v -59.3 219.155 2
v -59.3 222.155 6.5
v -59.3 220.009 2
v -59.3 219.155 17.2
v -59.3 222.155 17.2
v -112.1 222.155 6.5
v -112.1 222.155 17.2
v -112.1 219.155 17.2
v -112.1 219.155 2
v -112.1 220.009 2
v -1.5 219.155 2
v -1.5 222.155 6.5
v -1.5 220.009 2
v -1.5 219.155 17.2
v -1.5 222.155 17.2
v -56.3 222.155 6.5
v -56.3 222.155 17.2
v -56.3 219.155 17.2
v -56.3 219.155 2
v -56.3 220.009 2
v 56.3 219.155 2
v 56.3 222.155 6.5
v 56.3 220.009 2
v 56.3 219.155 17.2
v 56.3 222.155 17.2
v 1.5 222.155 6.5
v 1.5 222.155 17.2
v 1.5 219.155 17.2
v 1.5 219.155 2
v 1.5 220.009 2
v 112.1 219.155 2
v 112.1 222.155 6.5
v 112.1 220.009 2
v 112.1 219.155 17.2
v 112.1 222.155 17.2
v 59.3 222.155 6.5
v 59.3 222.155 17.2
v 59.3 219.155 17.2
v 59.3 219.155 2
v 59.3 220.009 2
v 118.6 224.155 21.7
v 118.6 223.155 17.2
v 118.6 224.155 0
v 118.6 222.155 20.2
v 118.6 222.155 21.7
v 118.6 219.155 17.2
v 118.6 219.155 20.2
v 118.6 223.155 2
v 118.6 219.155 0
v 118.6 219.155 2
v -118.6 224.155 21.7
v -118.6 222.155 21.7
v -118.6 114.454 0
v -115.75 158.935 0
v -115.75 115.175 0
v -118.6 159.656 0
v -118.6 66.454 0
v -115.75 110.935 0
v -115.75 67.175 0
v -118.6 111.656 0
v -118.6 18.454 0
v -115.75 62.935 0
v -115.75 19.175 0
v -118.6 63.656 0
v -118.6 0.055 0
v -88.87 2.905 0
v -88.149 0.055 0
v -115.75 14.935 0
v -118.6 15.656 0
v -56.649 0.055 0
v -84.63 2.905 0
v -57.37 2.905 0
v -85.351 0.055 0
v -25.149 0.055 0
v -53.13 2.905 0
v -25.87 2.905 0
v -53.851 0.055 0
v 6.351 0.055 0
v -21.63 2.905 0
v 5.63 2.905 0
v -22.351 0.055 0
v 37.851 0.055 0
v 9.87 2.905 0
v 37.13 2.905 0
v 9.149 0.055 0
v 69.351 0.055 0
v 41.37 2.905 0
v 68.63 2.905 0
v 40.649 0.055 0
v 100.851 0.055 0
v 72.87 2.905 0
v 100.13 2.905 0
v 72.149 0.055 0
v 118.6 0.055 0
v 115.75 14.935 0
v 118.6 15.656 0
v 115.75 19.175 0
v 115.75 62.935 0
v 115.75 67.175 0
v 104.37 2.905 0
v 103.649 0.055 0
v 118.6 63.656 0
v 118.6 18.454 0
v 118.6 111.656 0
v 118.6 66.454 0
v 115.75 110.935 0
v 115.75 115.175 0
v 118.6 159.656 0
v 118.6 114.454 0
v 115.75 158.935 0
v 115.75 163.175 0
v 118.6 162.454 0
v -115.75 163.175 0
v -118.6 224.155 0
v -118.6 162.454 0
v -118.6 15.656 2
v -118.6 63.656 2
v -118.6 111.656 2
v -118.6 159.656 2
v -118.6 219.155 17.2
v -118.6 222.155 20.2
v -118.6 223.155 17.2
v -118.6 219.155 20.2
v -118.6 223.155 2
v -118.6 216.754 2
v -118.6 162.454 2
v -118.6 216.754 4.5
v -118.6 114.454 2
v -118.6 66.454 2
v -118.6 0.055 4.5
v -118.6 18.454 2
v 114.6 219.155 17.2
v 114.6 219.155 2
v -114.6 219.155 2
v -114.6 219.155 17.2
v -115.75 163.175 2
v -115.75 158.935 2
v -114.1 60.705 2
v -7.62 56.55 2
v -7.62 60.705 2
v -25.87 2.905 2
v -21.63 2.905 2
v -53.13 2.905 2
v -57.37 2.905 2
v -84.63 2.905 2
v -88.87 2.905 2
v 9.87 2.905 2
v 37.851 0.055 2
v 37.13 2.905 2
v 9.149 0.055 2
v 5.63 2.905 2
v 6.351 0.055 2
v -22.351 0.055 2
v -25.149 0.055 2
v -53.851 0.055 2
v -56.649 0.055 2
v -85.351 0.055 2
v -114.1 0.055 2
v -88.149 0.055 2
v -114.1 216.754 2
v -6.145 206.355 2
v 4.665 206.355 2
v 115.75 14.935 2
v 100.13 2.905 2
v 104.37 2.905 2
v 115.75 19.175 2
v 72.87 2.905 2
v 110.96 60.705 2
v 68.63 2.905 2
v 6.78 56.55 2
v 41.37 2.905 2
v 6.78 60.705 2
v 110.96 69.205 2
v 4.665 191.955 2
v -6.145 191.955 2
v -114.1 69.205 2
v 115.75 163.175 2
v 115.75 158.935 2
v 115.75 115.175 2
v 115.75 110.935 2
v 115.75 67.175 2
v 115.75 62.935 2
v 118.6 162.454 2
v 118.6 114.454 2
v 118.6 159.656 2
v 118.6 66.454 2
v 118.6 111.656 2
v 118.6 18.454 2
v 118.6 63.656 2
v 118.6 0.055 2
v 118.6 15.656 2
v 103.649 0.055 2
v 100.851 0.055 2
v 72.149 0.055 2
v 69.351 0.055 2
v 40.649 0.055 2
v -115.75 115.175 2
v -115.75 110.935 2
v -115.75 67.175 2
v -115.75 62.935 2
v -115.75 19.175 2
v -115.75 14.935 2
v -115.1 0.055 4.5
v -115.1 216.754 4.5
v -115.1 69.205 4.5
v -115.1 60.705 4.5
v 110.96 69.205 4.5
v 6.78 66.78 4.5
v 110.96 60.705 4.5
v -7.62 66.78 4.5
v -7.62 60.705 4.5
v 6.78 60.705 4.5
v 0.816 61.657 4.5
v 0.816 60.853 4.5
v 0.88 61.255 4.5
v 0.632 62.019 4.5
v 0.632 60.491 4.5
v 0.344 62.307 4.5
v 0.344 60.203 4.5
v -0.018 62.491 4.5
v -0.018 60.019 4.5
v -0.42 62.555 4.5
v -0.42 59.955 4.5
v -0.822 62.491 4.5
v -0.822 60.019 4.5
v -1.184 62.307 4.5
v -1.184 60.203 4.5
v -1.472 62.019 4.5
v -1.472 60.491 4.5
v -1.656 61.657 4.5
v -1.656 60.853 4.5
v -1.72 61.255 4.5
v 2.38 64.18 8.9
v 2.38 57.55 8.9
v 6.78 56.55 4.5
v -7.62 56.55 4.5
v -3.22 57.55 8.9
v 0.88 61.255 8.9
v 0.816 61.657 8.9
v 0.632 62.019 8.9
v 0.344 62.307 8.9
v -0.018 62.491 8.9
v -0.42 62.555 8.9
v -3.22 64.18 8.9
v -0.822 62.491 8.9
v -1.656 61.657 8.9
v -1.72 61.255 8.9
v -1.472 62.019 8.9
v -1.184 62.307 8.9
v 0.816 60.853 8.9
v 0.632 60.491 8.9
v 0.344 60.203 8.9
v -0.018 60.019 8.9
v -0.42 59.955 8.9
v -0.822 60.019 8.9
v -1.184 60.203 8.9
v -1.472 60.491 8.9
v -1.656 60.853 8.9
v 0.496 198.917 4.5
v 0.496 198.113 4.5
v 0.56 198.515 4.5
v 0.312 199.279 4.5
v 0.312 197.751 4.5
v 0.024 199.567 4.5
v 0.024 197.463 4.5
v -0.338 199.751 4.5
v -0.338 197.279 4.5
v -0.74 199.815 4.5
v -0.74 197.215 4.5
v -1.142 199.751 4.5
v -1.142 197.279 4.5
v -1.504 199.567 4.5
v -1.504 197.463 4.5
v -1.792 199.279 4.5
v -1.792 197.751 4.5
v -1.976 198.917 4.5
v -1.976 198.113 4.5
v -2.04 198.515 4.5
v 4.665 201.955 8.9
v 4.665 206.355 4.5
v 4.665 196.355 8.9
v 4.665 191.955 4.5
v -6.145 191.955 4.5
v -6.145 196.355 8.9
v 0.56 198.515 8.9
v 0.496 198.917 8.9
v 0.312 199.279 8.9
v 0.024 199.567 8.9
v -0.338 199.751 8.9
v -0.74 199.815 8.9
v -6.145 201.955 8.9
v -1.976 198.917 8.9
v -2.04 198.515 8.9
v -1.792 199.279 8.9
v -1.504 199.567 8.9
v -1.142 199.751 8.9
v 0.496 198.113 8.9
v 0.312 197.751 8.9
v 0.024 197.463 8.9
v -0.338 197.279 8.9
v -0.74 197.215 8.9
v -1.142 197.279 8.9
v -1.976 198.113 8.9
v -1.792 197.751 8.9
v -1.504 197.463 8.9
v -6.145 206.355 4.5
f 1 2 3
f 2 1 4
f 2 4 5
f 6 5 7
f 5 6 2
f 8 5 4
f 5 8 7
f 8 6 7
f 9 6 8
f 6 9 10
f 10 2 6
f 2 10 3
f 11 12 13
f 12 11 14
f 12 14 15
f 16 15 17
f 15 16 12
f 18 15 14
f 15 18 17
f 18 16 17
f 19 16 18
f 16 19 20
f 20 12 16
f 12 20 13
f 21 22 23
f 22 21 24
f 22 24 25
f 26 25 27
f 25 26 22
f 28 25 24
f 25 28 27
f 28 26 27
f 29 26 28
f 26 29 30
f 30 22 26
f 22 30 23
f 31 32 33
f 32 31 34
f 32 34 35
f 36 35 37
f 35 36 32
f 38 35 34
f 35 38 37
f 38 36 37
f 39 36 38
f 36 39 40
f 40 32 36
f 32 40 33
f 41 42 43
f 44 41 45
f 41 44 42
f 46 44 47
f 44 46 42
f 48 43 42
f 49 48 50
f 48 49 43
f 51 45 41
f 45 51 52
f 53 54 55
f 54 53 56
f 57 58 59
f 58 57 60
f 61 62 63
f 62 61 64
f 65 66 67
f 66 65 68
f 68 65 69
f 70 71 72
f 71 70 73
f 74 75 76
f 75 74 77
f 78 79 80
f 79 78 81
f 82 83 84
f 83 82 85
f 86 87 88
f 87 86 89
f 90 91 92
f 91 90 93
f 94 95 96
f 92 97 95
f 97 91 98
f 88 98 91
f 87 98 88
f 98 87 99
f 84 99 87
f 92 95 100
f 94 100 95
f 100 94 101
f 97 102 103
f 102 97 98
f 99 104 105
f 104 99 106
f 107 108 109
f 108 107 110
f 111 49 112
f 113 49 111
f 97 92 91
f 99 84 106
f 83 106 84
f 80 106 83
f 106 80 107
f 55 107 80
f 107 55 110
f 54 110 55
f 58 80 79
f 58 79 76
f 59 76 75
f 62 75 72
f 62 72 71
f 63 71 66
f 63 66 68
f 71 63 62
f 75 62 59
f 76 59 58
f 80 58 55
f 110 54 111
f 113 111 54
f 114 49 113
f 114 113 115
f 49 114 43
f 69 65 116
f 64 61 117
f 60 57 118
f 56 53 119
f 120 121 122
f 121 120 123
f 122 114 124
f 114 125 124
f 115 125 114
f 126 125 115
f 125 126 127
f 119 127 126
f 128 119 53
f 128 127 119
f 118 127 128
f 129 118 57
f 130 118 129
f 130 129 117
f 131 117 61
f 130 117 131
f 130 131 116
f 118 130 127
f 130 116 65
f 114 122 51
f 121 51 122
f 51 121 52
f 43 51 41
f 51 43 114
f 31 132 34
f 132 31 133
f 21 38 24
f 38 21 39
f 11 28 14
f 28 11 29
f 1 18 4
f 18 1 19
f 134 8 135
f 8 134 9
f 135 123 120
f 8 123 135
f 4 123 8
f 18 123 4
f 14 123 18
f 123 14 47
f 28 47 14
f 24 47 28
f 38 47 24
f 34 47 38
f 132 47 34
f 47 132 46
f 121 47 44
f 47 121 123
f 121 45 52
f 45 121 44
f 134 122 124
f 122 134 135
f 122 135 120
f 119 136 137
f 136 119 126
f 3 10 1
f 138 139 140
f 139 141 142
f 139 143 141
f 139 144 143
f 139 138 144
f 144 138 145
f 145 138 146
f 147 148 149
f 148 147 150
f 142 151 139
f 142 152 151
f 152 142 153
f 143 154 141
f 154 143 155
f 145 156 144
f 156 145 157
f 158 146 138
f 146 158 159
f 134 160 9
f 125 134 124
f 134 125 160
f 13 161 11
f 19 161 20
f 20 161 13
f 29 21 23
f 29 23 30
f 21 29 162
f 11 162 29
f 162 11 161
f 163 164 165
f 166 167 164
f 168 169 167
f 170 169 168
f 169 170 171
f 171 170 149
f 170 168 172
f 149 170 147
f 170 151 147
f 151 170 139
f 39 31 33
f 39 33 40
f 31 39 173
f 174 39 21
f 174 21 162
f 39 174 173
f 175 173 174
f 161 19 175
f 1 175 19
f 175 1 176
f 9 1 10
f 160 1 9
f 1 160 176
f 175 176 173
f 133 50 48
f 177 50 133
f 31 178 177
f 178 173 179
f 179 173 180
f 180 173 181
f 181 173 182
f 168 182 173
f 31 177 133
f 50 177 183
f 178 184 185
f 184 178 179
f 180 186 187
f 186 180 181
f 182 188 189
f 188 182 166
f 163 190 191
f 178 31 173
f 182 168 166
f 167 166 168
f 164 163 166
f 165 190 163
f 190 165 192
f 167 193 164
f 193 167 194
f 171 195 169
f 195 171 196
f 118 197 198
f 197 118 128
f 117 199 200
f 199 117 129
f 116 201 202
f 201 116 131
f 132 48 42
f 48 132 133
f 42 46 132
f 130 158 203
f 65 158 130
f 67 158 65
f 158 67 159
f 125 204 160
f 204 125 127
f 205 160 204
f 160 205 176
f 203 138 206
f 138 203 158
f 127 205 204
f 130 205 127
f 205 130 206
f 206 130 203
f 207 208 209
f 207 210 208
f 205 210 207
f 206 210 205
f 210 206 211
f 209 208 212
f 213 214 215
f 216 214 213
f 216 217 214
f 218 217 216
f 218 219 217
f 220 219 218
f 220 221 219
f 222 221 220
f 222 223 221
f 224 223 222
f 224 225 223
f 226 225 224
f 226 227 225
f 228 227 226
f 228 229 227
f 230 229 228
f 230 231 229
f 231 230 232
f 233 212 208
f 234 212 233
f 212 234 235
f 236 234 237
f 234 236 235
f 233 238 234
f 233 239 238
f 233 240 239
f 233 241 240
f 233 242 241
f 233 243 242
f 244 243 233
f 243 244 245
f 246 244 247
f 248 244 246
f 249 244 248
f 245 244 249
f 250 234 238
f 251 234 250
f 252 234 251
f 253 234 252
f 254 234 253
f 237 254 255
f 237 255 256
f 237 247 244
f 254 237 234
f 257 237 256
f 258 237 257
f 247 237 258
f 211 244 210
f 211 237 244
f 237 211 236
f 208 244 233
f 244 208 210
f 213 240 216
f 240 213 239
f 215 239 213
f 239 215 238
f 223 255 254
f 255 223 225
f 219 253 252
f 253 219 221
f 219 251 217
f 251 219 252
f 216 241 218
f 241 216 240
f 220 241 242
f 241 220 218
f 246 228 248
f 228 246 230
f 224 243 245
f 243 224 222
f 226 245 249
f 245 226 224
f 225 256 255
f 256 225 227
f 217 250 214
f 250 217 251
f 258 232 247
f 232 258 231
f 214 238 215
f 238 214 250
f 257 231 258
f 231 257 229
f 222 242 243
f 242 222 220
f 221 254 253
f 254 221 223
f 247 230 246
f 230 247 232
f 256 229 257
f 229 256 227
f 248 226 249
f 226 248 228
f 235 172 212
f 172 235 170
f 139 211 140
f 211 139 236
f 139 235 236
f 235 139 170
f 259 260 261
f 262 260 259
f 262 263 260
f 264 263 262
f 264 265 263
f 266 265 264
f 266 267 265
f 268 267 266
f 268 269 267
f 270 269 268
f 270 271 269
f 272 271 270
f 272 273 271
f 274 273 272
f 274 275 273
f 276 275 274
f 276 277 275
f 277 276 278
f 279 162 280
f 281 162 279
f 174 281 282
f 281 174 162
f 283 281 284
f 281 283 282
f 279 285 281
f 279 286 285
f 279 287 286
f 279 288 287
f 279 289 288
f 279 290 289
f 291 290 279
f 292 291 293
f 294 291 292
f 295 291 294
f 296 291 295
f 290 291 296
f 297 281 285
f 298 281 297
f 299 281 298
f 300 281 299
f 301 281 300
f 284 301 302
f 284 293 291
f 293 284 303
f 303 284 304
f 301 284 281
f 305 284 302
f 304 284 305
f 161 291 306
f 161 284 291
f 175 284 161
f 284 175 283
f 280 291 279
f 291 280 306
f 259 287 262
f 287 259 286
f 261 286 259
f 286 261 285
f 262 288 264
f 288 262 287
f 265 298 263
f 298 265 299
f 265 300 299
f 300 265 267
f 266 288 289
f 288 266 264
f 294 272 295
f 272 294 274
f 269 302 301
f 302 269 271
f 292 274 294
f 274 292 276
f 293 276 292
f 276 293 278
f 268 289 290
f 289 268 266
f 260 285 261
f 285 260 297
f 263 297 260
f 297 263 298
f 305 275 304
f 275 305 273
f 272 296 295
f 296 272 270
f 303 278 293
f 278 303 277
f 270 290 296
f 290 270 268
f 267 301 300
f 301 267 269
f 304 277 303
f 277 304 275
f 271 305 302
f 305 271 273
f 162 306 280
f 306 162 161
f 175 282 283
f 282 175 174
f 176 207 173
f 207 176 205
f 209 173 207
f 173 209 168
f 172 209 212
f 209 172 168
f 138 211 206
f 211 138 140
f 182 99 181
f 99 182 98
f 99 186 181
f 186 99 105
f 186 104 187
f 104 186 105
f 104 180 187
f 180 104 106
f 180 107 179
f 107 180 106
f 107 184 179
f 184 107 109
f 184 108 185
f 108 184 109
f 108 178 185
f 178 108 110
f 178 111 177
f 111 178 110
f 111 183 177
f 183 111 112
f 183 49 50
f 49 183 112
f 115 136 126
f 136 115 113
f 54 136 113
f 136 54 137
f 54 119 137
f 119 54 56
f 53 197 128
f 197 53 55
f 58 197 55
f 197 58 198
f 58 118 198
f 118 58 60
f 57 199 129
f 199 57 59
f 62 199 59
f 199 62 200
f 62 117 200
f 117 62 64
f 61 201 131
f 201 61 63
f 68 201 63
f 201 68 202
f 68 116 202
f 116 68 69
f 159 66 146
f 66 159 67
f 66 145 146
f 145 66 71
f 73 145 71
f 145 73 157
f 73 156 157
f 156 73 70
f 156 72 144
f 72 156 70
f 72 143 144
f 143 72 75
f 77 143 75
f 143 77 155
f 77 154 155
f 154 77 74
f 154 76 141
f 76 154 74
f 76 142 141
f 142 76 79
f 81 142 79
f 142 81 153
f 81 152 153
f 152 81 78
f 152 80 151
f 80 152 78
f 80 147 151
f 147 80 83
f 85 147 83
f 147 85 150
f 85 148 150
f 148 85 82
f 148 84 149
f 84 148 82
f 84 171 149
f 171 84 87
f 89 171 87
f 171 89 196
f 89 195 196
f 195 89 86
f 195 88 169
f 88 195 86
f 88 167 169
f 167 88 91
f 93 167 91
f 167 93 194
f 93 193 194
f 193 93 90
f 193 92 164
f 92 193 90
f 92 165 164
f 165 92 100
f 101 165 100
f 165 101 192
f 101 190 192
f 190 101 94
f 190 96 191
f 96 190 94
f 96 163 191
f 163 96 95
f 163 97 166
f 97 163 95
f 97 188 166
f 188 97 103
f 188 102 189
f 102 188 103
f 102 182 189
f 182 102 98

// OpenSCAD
/*[Dimensions]*/
plateDims=[237.2,224.1,4.5];//dimensions of plate, thickness of structure
wallThck=2;//thickness of the wallsection
spcng=0.11; //spacing between walls
prssFit=0.03; //press Fit spacing on connectors

/* [Tongue&Groove] */
tgDist=[31.5,48];

/* [Ribs] */

/* [slots] */
sltsOffset=[0,1.2];


/* [screwDomes] */
mntHoleDia=2.6;

/* [show] */
showCustom=false; //show the customizations


/* [Hidden] */
flankAng=atan(2.5/1); //tan(alpha)=GK/AK
fudge=0.1;
$fn=20;
 

difference(){
 a3();
 if (showCustom) 
  translate([sltsOffset.x,sltsOffset.y,-fudge/2]) 
    linear_extrude(2.3+fudge) slotter(sltCnt=[9,20],center=true);
}

module a3(){
  domePos=[[118.18,61.2,wallThck],[117.86,198.46,wallThck]]; //center pos
  domeDims=[[14.4,10.23,6.9],[10.81,14.4,6.9]];
  domeFlanks=[[4.4,4.4,1,2.6],[0,0,4.4,4.4]];
  domeOffset=[[0,0.41],[0,0.64]];
  
  edgRibDims=[plateDims.y-5,4.5,plateDims.z-wallThck]; //length,width,height
  topRibDims=[plateDims.y-182.1,5,plateDims.z-wallThck]; //rib to the site
  topRibXPos=[33.52,63.3,97.83,145.69,178.91,209.8];

  //cutouts
  topFieldWidths=[52.8,54.8,54.8,52.8];
  topFieldPos=[6.5,
               topFieldWidths[0]+6.5+3,
               topFieldWidths[0]+topFieldWidths[1]+6.5+3*2,
               topFieldWidths[0]+topFieldWidths[1]+topFieldWidths[2]+6.5+3*3];

  translate([-plateDims.x/2      , spcng/2,0]){
    //plate
    linear_extrude(wallThck) difference(){
      square([plateDims.x,plateDims.y]);
      //grooves bottom
      for(i=[0:6])
        translate([i*tgDist.x+31.85,0]) tongGroove();
      //grooves left&right
      for(ix=[0,1],iy=[0:3]){
        rot= ix ? 90 : -90;
        translate([ix*plateDims.x,iy*tgDist.y+17]) rotate(rot) tongGroove();
      }
    }
    //top Wall
    translate([0,plateDims.y-5,0]) difference(){
      {
        cube([plateDims.x,5,21.7]);
        translate([-fudge/2,-fudge,20.2]) cube([plateDims.x+fudge,3+fudge,1.5+fudge]);
        //fields
        for (i=[0:3])
          translate([topFieldPos[i],-fudge,17.2]) 
            rotate([-90,0,0]) 
              sqFrustum([topFieldWidths[i],17.2,3+fudge],flanks=[0,0,0,6.5]);
        //corners
        translate([0,0,wallThck]) cylinder(d=4*2,h=17.2-wallThck,$fn=4);
        translate([plateDims.x,0,wallThck]) cylinder(d=4*2,h=17.2-wallThck,$fn=4);
      } 
      
    }
    //rib to the left
    translate([edgRibDims.y,0,wallThck]) rotate(90) rib(size=edgRibDims);
    //ribs to the top
    for (xPos=topRibXPos)
      translate([xPos,182.06,wallThck]) rotate(90) rib(size=topRibDims,chamfer=[1,1],tip=0);
    //screw Domes
    for (i=[0:len(domePos)-1])
      translate(domePos[i]) screwDome(domeDims[i],domeFlanks[i],domeOffset[i]);
    //rib in lower section
    translate([0,60.65,wallThck]) 
      rib(size=[230.57,8.5,plateDims.z-wallThck],chamfer=[0,0], tip=68);
  }
  
}

*slotter();
module slotter(sltDims=[5,15],sltDist=[40,20],sltCnt=[5,10],sltOffset=[20,0],rndSlt=true,center=false){
  //a module to generate slots in custom form and arrangement
  //defaults to IKEA SKADIS
  
  cntrOffset= center ? [-(sltDist.x*(sltCnt.x-1)+sltOffset.x)/2,-(sltDist.y*(sltCnt.y-1)-sltOffset.y)/2] :  [0,0,0];
  
  translate(cntrOffset) for (ix=[0:sltCnt.x-1],iy=[0:sltCnt.y-1]){
   xOffset= (iy % 2) ? sltOffset.x : 0;
   yOffset= (ix % 2) ? sltOffset.y : 0;
   translate([ix*sltDist.x+xOffset,iy*sltDist.y+yOffset]) slot();
  }
  
  module slot(){
    if (rndSlt){
      if (sltDims.x<sltDims.y) //vertical slot
        hull() for (iy=[-1,1])
          translate([0,iy*(sltDims.y-sltDims.x)/2]) circle(d=sltDims.x);
      
      if (sltDims.x>sltDims.y) //horizontal slot
        hull() for (ix=[-1,1])
          translate([ix*(sltDims.x-sltDims.y)/2,0]) circle(d=sltDims.y);
      else //round hole
        circle(d=sltDims.x);
    }
    else
      square(sltDims,center=true);
  }
}


module tongGroove(size=[4.24,2.85],angle=14.2,isTongue=false){
  
  //tongue and groove connectors
  spcng = isTongue ? [prssFit,prssFit]:[0,0];
  constrict=tan(angle)*size.y; //tan()=AK/GK
  poly=[[-size.x/2+constrict+spcng.x,0],[size.x/2-constrict-spcng.x,0],
        [size.x/2-spcng.x,size.y-spcng.y],[-size.x/2+spcng.x,size.y-spcng.y]];
  polygon(poly);
}

*rib();
module rib(size=[100,4.5,plateDims.z-wallThck], chamfer=[1,0],tip=46.16){
  tipAng= tip ? tip : 90; //atan(2.5/(219.1-216.7))=46.16;
  tipLngth=size.z/tan(tipAng);
  length = (tip) ? size.x-tipLngth : size.x;
  poly=[[0,0],[size.y,0],[size.y-chamfer[1],size.z],[chamfer[0],size.z]];
  
  tipVerts=[[0,0,0],[0,size.y,0],[0,size.y-chamfer[1],size.z],[0,chamfer[0],size.z],[tipLngth,0,0],[tipLngth,size.y,0]];
  tipFaces=[[0,1,2,3],[0,4,3],[2,1,5],[3,2,5,4],[0,1,5,4]];
  
  rotate([90,0,90]) linear_extrude(length) polygon(poly);
  translate([length,0,0]) 
    polyhedron(tipVerts,tipFaces);
}


module screwDome(size,flanks,baseOffset){
  //screw Dome centered on the hole
  //A3 center dome
  
  frstmHght=size.z-(plateDims.z-wallThck);
  cntrOffset=[-size.x/2,-size.y/2,0]+baseOffset;

  translate(cntrOffset){
    cube([size.x,size.y,plateDims.z-wallThck]);
    translate([0,0,plateDims.z-wallThck]) difference(){
      sqFrustum([size.x,size.y,frstmHght],flanks);
      translate([size.x/2,size.y/2,-fudge/2]-baseOffset) cylinder(d=mntHoleDia,h=frstmHght+fudge);
    }
  }

}

*sqFrustum();
module sqFrustum(size=[1,1,1], flanks=[0.1,0.1,0.1,0.1], center=false, method="poly"){
  //a square frustum --> cube with a trapezoid crosssection
  //https://en.wikipedia.org/wiki/Frustum
  
  //size = base dimensions x height
  //https://en.wikibooks.org/wiki/OpenSCAD_User_Manual/Primitive_Solids#polyhedron
  cntrOffset= (center) ? [0,0,-size.z/2] : [size.x/2,size.y/2,size.z/2];

  //flankRed=[tan(flankAng.x)*size.z,tan(flankAng.x)*size.z]; //reduction in width by angle
  faceScale=[(size.x-(flanks[0]+flanks[1]))/size.x,(size.y-(flanks[2]+flanks[3]))/size.y]; //scale factor for linExt
  faceOffset=0; //TODO calculate faceOffset for linear_extrusion method, when flanks are different
  if (method=="linExt")
    translate(cntrOffset)
      linear_extrude(size.z,scale=faceScale)
        square([size.x,size.y],true);
  else{ //for export to FreeCAD/StepUp
    verts= [[-size.x/2,-size.y/2,-size.z/2], //0
            [ size.x/2,-size.y/2,-size.z/2], //1
            [ size.x/2, size.y/2,-size.z/2], //2
            [-size.x/2, size.y/2,-size.z/2],//3
            [-(size.x/2-flanks[0]),-(size.y/2-flanks[2]),size.z/2],  //4
            [  size.x/2-flanks[1] ,-(size.y/2-flanks[2]),size.z/2],  //5
            [  size.x/2-flanks[1] , (size.y/2-flanks[3]),size.z/2],  //5
            [-(size.x/2-flanks[0]), (size.y/2-flanks[3]),size.z/2]]; //5
    faces= [[0,1,2,3],  // bottom
            [4,5,1,0],  // front
            [7,6,5,4],  // top
            [5,6,2,1],  // right
            [6,7,3,2],  // back
            [7,4,0,3]]; // left
  translate(cntrOffset) polyhedron(verts,faces,convexity=2);
  }
}
